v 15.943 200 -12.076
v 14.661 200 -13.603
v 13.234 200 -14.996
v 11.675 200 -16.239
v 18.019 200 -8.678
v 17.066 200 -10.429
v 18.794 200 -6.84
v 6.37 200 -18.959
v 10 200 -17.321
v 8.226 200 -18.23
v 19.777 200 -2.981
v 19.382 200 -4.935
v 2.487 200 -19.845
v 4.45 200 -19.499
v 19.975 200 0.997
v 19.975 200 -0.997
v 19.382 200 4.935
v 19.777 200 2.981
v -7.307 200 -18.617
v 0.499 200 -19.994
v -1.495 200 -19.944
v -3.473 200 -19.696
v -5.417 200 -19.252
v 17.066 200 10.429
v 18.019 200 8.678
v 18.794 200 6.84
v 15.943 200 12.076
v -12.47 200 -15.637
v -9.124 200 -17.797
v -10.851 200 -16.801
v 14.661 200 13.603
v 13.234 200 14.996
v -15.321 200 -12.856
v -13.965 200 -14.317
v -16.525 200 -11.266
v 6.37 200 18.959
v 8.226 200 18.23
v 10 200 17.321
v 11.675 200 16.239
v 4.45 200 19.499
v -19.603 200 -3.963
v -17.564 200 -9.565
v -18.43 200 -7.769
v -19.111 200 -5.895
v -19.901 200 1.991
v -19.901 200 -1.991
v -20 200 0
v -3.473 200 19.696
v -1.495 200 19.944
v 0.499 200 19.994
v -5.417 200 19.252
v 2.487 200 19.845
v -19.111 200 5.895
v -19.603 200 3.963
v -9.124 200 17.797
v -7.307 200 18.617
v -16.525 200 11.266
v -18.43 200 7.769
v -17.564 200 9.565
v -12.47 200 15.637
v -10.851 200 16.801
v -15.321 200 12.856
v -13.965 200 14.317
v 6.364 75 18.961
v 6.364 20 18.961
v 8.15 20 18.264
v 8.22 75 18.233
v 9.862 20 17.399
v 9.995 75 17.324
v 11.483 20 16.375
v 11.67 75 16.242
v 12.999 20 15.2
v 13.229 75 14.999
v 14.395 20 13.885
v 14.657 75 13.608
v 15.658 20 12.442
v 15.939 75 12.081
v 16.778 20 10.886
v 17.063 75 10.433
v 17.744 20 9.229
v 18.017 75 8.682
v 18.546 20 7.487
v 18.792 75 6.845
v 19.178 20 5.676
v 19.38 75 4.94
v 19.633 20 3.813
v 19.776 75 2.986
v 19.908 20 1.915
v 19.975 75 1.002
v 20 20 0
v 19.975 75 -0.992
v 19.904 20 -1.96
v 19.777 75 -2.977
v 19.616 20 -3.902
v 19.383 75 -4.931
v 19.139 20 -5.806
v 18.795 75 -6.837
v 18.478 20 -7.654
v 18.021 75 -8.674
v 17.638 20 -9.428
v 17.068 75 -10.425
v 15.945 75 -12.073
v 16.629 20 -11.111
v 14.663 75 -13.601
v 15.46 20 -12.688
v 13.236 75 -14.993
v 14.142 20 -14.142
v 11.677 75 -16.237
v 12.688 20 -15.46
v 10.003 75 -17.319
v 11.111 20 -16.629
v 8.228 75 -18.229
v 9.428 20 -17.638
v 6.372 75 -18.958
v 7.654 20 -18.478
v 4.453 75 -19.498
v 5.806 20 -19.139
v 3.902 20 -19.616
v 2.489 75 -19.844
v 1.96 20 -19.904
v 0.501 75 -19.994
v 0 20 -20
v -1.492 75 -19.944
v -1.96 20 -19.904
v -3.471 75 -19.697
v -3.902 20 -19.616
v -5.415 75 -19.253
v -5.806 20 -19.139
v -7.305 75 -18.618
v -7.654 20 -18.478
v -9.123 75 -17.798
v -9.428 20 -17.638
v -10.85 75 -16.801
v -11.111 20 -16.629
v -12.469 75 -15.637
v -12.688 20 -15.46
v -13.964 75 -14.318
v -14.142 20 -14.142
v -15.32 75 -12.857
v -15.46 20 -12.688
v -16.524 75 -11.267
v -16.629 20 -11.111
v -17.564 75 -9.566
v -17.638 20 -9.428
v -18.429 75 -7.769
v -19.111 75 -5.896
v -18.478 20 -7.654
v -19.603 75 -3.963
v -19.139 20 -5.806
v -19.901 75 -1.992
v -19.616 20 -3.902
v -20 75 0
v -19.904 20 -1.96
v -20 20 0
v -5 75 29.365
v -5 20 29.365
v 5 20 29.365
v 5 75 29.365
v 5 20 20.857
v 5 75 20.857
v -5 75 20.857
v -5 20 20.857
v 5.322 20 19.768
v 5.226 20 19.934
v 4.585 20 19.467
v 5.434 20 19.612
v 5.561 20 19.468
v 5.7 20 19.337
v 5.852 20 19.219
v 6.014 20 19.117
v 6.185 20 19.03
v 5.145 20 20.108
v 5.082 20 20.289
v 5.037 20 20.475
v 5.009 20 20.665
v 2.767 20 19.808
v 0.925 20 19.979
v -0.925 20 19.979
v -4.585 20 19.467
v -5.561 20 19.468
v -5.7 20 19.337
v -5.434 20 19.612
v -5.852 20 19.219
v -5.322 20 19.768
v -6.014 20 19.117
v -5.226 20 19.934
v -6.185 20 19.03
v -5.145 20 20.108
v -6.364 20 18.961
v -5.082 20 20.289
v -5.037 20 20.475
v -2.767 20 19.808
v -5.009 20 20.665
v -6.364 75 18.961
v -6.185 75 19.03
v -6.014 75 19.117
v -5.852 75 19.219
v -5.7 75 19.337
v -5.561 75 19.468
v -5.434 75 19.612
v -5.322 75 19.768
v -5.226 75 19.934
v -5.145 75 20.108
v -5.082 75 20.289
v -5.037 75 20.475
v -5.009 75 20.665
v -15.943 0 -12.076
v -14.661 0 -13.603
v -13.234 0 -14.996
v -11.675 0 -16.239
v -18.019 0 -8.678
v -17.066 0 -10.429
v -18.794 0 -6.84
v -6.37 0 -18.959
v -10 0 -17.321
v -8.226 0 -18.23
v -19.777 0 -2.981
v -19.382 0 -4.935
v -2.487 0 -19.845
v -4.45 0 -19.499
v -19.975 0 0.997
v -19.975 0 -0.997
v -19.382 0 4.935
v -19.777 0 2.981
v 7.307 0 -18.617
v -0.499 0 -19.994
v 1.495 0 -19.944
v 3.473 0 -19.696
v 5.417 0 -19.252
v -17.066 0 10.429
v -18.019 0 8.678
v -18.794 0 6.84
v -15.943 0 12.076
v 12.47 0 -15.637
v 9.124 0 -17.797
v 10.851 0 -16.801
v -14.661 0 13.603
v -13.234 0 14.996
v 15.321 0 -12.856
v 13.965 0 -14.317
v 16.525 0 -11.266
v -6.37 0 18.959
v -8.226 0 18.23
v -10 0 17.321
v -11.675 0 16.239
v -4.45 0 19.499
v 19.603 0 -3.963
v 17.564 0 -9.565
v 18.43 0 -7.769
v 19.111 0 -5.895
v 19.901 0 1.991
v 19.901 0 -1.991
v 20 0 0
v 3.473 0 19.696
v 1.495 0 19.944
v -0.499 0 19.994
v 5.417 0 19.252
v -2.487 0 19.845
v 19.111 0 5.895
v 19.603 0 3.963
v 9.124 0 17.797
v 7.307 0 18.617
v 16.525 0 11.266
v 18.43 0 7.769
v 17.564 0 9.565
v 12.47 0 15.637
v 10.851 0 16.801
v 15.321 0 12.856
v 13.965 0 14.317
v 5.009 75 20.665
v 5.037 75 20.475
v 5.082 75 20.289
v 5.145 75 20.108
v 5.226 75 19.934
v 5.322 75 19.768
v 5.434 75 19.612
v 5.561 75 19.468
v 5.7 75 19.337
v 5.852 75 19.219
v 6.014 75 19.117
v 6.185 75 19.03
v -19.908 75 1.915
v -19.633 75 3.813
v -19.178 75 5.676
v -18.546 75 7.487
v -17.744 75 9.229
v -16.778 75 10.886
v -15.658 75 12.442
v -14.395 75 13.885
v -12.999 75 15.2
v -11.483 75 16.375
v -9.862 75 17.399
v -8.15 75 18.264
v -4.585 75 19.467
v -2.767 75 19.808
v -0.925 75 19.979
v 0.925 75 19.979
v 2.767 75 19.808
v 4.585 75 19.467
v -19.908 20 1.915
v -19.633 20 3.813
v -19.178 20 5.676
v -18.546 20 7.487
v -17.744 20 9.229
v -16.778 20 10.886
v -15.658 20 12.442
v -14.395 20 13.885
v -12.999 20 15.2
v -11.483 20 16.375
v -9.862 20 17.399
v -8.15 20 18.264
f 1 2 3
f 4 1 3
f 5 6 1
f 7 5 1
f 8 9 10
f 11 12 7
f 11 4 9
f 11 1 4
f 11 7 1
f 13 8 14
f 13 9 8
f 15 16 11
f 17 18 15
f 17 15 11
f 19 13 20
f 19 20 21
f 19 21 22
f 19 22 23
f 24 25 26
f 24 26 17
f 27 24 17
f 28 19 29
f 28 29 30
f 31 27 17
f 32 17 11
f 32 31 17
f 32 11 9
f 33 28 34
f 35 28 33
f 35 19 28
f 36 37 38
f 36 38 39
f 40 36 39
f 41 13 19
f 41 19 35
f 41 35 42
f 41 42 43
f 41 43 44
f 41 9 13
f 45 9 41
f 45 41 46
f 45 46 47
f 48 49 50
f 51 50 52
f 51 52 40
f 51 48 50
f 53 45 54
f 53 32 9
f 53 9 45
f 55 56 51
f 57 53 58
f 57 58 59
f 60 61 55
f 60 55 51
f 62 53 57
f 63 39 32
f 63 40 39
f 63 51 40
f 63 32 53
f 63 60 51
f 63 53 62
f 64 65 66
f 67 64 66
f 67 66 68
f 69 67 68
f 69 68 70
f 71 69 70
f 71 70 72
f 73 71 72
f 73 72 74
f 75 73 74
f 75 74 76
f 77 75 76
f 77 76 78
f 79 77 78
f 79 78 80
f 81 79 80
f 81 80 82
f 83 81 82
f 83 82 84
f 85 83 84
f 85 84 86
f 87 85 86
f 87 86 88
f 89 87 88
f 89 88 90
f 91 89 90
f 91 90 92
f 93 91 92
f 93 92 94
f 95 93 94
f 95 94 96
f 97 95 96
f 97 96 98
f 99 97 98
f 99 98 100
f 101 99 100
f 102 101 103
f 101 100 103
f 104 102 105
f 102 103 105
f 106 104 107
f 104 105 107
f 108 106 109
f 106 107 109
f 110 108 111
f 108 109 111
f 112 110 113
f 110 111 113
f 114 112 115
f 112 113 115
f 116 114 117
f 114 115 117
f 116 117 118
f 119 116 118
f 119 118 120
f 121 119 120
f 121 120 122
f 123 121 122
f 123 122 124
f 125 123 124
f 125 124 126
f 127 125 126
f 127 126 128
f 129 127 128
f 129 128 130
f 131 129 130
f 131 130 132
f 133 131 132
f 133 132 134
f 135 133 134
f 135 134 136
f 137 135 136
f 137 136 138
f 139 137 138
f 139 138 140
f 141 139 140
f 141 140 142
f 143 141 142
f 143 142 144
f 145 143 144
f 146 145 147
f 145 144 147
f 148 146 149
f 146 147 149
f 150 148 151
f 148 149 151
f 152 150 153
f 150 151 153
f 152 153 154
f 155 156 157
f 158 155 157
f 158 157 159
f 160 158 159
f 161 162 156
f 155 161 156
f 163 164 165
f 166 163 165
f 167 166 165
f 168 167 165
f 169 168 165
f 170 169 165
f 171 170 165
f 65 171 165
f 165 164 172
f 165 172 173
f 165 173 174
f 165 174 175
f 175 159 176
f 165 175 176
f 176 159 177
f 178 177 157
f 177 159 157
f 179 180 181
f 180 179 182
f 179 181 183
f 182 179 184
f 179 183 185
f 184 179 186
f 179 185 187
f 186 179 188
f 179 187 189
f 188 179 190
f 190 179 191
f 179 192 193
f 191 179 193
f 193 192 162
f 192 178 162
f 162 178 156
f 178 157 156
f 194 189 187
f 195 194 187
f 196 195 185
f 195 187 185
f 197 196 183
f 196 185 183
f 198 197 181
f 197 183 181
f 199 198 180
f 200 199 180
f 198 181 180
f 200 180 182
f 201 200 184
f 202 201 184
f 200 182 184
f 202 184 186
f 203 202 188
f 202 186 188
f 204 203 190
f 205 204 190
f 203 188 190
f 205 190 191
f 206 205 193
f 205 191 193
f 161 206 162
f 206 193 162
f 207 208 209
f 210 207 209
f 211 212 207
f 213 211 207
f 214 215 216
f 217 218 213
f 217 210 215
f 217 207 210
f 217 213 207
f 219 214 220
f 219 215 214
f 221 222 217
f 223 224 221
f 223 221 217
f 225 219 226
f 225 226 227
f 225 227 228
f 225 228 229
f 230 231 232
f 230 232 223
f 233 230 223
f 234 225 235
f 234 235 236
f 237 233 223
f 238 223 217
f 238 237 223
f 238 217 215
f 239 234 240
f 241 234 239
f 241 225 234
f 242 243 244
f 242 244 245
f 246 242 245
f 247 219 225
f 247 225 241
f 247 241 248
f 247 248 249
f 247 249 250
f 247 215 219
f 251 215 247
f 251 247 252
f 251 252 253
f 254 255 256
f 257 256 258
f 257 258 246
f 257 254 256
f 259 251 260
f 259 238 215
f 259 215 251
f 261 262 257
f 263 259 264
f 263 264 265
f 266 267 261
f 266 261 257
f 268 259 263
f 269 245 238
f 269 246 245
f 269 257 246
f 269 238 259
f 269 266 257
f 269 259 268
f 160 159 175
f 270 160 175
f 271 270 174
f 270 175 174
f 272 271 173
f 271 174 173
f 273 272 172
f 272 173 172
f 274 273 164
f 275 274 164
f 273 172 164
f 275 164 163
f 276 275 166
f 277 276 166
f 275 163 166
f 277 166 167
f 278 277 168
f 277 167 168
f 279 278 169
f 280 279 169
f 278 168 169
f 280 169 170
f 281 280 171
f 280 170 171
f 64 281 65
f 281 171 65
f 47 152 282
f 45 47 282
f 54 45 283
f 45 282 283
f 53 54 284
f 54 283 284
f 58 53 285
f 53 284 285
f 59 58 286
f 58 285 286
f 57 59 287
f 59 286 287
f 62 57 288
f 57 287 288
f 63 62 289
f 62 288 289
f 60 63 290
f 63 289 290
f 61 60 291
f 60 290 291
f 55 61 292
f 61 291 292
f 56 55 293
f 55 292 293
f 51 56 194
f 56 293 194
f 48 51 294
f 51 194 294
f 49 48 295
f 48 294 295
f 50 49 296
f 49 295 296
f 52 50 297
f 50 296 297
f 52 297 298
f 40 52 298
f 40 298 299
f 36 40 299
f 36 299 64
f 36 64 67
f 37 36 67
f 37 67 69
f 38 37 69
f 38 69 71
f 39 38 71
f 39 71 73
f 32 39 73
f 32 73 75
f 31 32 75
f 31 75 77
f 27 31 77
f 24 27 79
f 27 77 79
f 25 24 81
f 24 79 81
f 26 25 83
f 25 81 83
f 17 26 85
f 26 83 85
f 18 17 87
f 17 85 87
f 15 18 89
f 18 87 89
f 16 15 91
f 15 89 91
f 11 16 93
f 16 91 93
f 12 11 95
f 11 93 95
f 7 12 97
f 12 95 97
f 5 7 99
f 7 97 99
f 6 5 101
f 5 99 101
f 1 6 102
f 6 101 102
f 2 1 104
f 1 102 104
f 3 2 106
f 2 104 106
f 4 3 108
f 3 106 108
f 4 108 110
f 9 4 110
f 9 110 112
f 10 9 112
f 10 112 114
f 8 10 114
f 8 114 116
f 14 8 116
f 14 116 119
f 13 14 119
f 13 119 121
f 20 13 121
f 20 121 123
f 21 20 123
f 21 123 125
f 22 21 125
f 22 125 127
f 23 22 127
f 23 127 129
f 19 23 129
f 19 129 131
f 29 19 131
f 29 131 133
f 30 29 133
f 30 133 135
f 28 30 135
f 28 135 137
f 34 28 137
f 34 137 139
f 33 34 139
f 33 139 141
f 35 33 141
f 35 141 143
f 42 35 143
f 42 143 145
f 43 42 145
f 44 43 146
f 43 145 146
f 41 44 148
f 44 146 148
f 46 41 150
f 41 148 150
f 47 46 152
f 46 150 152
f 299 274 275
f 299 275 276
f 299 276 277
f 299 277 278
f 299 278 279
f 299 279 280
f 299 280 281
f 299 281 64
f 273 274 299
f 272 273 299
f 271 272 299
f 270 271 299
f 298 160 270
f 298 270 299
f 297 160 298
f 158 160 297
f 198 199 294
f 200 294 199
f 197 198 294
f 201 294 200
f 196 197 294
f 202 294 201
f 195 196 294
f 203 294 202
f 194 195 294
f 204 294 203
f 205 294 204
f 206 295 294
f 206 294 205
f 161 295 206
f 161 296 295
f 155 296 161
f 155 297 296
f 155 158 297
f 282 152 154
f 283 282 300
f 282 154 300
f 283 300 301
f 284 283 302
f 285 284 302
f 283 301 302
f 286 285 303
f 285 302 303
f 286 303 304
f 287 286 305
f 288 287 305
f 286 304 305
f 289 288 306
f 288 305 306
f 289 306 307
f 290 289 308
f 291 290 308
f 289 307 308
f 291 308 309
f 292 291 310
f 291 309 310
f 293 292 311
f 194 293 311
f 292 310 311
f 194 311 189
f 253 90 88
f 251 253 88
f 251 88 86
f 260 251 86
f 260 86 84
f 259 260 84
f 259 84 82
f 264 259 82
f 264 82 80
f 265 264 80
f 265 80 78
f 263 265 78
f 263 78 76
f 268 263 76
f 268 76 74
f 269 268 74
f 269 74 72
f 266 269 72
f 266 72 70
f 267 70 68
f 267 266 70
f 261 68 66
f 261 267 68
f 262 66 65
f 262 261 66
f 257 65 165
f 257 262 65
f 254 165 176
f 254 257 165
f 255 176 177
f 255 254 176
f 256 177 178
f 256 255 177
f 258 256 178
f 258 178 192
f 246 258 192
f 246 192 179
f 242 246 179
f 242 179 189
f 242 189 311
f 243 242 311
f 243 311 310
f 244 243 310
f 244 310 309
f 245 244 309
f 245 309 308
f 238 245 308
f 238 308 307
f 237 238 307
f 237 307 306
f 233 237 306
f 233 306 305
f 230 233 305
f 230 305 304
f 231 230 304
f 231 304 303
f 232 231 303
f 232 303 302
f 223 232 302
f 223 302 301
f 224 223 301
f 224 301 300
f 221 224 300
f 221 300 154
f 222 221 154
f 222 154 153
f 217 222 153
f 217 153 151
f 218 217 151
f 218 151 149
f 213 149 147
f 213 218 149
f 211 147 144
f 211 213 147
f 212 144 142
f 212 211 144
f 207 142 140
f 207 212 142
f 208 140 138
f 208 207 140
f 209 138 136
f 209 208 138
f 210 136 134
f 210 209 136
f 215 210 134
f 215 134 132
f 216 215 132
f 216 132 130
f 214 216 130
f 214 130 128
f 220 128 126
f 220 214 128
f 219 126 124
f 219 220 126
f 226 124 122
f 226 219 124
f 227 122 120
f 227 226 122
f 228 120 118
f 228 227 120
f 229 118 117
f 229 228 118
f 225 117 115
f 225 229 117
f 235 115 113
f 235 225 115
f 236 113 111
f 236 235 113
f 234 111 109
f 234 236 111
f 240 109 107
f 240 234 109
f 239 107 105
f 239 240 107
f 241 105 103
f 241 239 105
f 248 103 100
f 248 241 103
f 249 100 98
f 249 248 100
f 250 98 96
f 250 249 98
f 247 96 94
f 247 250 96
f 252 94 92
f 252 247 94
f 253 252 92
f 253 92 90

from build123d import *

# Parameters (mm, degrees)
F0_R      = 20
F1_DEPTH  = 20
F1_FACE_R = 20
F3_DEPTH  = 55
F4_R      = 20
F5_DEPTH  = 125


with BuildPart() as f1:
    # F0 (on Front) → F1 (new body)
    with BuildSketch(Plane.XZ):
        Circle(F0_R)
    extrude(amount=-F1_DEPTH)

    # F2 (on face) + F1_face (on face) → F3 (join)
    with BuildSketch(Plane(origin=(0, 20, 0), x_dir=(-1, 0, 0), z_dir=(0, 1, 0))):
        with BuildLine():
            ThreePointArc((6.363636, 18.960594), (0, 20), (-6.363636, 18.960594))
            ThreePointArc((-6.363636, 18.960594), (-11.677484, -16.236883), (20, 0))
            ThreePointArc((20, 0), (16.236883, 11.677484), (6.363636, 18.960594))
        make_face()
        with BuildLine():
            ThreePointArc((-5, 20.856654), (-5.376312, 19.688905), (-6.363636, 18.960594))
            ThreePointArc((-6.363636, 18.960594), (0, 20), (6.363636, 18.960594))
            ThreePointArc((6.363636, 18.960594), (5.376312, 19.688905), (5, 20.856654))
            Line((5, 20.856654), (5, 29.364917))
            Line((5, 29.364917), (-5, 29.364917))
            Line((-5, 29.364917), (-5, 20.856654))
        make_face()
    with BuildSketch(Plane(origin=(0, 20, 0), x_dir=(1, 0, 0), z_dir=(0, 1, 0))):
        Circle(F1_FACE_R)
    extrude(amount=F3_DEPTH)

    # F4 (on face) → F5 (join)
    with BuildSketch(Plane(origin=(0, 75, 0), x_dir=(-1, 0, 0), z_dir=(0, 1, 0))):
        Circle(F4_R)
    extrude(amount=F5_DEPTH)


solid = f1.part
